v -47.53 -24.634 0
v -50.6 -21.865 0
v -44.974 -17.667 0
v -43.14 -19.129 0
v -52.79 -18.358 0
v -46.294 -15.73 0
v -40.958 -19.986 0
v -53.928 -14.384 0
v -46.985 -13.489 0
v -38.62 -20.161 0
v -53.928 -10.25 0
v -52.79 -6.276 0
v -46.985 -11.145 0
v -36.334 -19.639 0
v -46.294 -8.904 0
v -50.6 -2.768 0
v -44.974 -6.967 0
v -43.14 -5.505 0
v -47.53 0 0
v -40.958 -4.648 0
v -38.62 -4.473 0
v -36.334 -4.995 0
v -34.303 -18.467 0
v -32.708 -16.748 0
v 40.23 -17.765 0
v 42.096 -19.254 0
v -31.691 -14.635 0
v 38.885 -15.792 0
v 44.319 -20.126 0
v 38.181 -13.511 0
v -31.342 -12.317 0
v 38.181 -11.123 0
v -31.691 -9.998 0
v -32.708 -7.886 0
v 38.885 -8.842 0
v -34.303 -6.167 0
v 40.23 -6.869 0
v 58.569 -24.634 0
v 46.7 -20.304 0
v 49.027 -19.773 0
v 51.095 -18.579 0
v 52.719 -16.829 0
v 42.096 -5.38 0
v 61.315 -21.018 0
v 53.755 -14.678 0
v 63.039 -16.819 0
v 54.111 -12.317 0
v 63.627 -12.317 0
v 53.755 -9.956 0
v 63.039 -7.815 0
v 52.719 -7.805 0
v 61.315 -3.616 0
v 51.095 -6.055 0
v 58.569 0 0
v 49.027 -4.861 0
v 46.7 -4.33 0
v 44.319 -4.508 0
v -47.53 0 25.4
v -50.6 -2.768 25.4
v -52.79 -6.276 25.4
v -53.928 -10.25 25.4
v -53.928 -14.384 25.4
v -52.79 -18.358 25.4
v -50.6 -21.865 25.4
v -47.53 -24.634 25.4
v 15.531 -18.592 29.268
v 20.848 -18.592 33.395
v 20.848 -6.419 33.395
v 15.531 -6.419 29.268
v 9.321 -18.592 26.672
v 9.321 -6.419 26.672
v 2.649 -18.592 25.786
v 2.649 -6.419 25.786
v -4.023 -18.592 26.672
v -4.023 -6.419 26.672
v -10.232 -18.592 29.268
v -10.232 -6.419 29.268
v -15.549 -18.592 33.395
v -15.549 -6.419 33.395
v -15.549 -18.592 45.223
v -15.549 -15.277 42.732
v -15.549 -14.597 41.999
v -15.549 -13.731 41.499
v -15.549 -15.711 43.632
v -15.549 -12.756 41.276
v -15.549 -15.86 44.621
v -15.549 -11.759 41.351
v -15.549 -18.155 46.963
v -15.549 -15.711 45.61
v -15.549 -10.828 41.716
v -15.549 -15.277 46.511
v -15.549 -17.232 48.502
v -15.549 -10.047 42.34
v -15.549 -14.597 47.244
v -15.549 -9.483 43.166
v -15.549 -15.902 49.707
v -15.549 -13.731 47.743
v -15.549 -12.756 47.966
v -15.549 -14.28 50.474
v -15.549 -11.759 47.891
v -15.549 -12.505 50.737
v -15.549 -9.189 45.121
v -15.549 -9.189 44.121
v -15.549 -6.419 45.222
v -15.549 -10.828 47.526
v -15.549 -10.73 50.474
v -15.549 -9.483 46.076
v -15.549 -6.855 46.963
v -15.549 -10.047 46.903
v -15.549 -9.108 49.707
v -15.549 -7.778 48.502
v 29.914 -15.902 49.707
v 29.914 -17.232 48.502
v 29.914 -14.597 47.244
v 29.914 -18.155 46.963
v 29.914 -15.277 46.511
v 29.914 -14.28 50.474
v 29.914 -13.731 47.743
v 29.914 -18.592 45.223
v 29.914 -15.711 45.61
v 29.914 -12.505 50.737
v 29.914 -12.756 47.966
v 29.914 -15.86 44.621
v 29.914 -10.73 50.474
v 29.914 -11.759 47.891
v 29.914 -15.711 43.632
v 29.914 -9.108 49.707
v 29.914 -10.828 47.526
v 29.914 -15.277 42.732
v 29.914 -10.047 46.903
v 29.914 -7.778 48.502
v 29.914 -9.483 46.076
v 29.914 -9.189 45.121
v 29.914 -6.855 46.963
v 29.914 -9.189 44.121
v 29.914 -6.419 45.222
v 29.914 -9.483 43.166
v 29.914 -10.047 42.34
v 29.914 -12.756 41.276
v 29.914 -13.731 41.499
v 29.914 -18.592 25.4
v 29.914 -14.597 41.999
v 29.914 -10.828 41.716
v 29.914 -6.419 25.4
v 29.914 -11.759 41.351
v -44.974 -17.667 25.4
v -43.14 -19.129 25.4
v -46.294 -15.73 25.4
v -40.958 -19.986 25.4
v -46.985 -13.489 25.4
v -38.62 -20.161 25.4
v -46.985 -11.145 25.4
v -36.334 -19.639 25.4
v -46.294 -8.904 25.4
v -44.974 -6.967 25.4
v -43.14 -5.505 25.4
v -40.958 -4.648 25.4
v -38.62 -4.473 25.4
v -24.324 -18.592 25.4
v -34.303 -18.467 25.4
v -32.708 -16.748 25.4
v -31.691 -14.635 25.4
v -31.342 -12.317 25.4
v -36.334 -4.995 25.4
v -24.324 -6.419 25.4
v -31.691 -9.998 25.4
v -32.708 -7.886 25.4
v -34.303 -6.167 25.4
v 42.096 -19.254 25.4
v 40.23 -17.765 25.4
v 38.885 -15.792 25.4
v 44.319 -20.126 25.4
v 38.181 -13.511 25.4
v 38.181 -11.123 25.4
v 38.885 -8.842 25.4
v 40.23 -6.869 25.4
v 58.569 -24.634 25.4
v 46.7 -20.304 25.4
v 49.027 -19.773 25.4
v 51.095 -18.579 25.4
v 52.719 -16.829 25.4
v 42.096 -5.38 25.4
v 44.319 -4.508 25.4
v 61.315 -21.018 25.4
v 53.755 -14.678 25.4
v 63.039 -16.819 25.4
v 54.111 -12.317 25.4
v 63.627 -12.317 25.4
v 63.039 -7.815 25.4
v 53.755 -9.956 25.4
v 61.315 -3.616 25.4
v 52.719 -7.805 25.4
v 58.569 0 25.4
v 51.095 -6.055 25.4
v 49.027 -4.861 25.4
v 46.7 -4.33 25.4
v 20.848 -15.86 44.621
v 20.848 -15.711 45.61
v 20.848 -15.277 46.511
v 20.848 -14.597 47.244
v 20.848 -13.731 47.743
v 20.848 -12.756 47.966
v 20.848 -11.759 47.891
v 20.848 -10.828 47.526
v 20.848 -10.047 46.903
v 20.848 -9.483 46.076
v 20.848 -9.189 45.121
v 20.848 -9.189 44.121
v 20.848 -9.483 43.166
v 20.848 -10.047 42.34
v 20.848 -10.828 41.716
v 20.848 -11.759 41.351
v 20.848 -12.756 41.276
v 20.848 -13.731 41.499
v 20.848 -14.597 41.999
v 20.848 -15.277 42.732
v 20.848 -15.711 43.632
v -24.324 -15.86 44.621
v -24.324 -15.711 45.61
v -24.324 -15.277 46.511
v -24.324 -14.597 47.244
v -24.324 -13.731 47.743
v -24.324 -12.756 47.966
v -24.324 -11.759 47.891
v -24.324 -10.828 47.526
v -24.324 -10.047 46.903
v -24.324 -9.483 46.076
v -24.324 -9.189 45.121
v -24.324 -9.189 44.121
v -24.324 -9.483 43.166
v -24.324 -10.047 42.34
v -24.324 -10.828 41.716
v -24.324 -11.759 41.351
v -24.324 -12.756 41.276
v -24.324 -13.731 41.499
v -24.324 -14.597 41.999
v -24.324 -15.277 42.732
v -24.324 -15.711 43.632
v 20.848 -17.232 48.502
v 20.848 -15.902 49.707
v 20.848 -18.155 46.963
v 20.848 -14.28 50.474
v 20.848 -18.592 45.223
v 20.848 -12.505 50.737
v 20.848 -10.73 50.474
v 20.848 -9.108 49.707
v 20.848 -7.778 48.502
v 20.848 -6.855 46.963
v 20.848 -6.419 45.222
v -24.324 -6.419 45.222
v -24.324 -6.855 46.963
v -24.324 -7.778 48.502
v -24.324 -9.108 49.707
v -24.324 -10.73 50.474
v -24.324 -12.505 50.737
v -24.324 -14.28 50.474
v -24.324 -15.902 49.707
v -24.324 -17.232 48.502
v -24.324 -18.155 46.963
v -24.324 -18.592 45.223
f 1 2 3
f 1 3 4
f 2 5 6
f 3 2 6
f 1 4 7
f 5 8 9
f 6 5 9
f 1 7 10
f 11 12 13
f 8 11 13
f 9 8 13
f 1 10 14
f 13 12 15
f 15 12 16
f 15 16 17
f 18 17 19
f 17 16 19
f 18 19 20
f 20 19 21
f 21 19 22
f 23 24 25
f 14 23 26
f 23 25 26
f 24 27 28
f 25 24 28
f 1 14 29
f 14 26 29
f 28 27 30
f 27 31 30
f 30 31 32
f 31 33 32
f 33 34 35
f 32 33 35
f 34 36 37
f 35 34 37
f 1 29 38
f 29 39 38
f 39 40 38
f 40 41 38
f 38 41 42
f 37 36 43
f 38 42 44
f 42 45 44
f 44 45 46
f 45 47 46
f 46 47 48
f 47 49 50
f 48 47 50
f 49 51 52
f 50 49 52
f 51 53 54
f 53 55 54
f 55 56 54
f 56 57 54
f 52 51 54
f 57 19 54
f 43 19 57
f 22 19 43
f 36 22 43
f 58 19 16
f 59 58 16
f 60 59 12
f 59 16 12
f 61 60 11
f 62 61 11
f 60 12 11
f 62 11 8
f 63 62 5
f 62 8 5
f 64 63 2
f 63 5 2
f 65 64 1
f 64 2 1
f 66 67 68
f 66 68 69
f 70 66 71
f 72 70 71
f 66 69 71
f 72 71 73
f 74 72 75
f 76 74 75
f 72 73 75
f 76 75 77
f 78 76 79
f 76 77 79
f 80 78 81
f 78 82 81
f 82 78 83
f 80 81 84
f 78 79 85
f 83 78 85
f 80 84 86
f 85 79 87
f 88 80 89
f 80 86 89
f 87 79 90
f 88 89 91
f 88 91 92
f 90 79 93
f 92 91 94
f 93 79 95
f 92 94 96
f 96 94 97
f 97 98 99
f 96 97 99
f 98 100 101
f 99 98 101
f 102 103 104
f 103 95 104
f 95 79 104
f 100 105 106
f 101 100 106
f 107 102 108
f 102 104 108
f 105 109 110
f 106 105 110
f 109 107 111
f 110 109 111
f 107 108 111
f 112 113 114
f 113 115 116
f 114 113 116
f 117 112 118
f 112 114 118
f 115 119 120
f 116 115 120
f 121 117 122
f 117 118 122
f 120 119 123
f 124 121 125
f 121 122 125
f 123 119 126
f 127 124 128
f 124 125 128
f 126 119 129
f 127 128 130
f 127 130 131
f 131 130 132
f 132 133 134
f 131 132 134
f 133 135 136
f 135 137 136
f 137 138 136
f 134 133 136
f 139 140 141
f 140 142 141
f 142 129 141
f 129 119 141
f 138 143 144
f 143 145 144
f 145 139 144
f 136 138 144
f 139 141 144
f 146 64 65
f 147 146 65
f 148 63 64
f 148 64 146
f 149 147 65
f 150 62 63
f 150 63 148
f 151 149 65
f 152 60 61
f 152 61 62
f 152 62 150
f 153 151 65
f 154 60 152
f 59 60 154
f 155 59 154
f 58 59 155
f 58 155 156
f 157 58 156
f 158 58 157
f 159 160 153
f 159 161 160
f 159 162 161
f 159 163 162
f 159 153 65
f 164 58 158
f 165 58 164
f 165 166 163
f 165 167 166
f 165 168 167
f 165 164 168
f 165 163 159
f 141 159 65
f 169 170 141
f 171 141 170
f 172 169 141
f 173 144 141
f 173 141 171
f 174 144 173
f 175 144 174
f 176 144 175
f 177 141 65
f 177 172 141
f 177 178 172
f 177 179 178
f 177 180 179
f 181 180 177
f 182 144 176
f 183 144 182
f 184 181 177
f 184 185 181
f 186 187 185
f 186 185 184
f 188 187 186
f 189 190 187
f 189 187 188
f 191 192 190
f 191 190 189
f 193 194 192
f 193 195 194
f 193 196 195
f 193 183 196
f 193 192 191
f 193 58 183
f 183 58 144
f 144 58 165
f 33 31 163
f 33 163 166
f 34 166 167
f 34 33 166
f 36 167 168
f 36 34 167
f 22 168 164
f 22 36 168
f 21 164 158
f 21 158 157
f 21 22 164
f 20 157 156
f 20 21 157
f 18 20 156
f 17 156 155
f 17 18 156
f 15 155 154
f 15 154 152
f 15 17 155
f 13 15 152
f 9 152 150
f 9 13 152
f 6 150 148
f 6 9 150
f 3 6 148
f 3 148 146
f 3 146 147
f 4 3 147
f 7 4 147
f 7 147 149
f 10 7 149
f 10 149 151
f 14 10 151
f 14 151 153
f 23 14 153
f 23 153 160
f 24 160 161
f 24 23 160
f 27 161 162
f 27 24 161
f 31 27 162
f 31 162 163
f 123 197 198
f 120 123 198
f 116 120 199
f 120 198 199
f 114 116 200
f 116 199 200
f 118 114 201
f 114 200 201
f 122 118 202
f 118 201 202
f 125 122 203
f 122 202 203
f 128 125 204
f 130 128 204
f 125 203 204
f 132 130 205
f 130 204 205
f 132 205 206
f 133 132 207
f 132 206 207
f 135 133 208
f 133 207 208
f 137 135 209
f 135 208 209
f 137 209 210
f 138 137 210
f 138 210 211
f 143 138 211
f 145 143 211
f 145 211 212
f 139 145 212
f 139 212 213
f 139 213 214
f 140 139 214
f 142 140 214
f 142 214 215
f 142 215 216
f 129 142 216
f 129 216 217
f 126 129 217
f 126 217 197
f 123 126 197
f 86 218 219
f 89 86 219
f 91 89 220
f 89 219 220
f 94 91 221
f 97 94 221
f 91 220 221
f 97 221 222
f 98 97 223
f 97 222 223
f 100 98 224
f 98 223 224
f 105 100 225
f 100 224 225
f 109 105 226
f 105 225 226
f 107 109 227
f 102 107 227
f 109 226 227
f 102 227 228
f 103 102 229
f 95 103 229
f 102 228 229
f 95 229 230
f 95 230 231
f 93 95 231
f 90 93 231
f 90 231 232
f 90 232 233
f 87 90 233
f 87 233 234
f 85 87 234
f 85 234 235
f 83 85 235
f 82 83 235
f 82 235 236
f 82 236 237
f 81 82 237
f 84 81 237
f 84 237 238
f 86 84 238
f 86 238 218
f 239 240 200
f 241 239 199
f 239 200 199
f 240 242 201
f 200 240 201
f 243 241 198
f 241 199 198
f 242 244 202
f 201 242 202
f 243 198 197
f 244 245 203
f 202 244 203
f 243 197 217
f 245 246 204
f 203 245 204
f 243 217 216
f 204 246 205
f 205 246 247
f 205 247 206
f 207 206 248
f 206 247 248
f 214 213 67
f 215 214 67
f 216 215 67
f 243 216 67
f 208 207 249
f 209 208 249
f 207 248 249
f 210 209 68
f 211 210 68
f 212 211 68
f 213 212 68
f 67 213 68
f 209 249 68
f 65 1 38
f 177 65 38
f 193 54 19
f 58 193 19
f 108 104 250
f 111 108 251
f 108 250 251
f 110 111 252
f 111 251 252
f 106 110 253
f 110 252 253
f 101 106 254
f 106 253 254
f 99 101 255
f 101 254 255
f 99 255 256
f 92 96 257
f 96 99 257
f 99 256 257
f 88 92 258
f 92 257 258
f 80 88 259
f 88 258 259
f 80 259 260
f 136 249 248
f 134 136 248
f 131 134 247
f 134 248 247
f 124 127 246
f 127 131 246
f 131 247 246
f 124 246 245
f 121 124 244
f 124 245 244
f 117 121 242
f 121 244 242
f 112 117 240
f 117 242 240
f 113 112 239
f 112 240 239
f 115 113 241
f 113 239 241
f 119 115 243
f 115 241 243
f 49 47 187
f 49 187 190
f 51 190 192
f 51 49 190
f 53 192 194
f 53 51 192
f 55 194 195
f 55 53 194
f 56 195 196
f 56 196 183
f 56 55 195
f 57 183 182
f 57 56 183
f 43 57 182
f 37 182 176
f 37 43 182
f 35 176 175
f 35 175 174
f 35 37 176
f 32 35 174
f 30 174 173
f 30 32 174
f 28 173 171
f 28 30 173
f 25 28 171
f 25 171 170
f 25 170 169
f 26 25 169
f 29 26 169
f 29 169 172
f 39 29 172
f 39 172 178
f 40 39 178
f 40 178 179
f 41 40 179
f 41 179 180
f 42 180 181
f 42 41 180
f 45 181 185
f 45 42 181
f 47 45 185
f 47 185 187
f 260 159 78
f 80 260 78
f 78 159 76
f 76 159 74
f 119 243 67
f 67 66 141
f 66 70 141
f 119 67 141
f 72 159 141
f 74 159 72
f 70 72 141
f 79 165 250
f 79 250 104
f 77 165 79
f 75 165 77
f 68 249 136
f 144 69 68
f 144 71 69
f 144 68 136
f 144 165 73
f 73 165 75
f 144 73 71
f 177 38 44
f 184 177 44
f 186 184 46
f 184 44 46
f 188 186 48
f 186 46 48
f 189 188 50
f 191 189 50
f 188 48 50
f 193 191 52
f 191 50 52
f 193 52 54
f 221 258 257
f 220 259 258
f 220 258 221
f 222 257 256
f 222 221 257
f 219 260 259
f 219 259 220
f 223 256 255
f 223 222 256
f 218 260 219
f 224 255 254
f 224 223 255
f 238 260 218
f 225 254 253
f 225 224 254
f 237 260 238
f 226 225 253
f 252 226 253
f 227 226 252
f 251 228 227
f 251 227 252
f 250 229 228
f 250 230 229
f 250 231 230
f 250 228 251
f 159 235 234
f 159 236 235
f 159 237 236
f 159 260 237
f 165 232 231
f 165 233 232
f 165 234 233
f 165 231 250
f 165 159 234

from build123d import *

# Parameters (mm, degrees)
F0_R     = 7.8658205016
F0_R_2   = 8.0096944888
F1_DEPTH = 25.4
F2_W     = 54.2384404689
F2_H     = 12.1728531085
F3_DEPTH = 25.4
F5_DEPTH = 25.4
F6_R     = 3.3542510186
F7_DEPTH = 77.978


with BuildPart() as f1:
    # F0 (on Top) → F1 (new body)
    with BuildSketch(Plane.XY):
        with BuildLine():
            ThreePointArc((-47.5300452468, 0), (-54.0726039784, -12.3169262593), (-47.5300452468, -24.6338525186))
            Line((-47.5300452468, -24.6338525186), (58.5692822962, -24.6338525186))
            ThreePointArc((58.5692822962, -24.6338525186), (63.62716281, -12.3169262593), (58.5692822962, 0))
            Line((58.5692822962, 0), (-47.5300452468, 0))
        make_face()
        with Locations((-39.2074911675, -12.3169262593)):
            Circle(F0_R, mode=Mode.SUBTRACT)
        with Locations((46.10116281, -12.3169262593)):
            Circle(F0_R_2, mode=Mode.SUBTRACT)
    extrude(amount=F1_DEPTH)

    # F2 (on face) → F3 (join)
    with BuildSketch(Plane.XY.offset(25.4)):
        with Locations((2.7952184901, -12.50546542)):
            Rectangle(F2_W, F2_H)
    extrude(amount=F3_DEPTH)

    # F4 (on face) → F5 (cut)
    with BuildSketch(Plane(origin=(0, -6.4190388657, 0), x_dir=(-1, 0, 0), z_dir=(0, 1, 0))):
        with BuildLine():
            Line((15.5491959304, 50.8), (-20.8479575813, 50.8))
            Line((-20.8479575813, 50.8), (-20.8479575813, 33.394984901))
            ThreePointArc((-20.8479575813, 33.394984901), (-2.6493808255, 25.785842215), (15.5491959304, 33.394984901))
            Line((15.5491959304, 33.394984901), (15.5491959304, 50.8))
        make_face()
    extrude(amount=-F5_DEPTH, mode=Mode.SUBTRACT)

    # F6 (on face) → F7 (cut)
    with BuildSketch(Plane(origin=(-24.3240017444, 0, 0), x_dir=(0, -1, 0), z_dir=(-1, 0, 0))):
        with BuildLine():
            ThreePointArc((6.4190388657, 45.2219136059), (12.5051093125, 50.7371205343), (18.5918919742, 45.2226996422))
            Line((18.5918919742, 45.2226996422), (18.5918919742, 50.8))
            Line((18.5918919742, 50.8), (6.4190388657, 50.8))
            Line((6.4190388657, 50.8), (6.4190388657, 45.2219136059))
        make_face()
        with Locations((12.5055042435, 44.6210700417)):
            Circle(F6_R)
    extrude(amount=-F7_DEPTH, mode=Mode.SUBTRACT)


solid = f1.part
